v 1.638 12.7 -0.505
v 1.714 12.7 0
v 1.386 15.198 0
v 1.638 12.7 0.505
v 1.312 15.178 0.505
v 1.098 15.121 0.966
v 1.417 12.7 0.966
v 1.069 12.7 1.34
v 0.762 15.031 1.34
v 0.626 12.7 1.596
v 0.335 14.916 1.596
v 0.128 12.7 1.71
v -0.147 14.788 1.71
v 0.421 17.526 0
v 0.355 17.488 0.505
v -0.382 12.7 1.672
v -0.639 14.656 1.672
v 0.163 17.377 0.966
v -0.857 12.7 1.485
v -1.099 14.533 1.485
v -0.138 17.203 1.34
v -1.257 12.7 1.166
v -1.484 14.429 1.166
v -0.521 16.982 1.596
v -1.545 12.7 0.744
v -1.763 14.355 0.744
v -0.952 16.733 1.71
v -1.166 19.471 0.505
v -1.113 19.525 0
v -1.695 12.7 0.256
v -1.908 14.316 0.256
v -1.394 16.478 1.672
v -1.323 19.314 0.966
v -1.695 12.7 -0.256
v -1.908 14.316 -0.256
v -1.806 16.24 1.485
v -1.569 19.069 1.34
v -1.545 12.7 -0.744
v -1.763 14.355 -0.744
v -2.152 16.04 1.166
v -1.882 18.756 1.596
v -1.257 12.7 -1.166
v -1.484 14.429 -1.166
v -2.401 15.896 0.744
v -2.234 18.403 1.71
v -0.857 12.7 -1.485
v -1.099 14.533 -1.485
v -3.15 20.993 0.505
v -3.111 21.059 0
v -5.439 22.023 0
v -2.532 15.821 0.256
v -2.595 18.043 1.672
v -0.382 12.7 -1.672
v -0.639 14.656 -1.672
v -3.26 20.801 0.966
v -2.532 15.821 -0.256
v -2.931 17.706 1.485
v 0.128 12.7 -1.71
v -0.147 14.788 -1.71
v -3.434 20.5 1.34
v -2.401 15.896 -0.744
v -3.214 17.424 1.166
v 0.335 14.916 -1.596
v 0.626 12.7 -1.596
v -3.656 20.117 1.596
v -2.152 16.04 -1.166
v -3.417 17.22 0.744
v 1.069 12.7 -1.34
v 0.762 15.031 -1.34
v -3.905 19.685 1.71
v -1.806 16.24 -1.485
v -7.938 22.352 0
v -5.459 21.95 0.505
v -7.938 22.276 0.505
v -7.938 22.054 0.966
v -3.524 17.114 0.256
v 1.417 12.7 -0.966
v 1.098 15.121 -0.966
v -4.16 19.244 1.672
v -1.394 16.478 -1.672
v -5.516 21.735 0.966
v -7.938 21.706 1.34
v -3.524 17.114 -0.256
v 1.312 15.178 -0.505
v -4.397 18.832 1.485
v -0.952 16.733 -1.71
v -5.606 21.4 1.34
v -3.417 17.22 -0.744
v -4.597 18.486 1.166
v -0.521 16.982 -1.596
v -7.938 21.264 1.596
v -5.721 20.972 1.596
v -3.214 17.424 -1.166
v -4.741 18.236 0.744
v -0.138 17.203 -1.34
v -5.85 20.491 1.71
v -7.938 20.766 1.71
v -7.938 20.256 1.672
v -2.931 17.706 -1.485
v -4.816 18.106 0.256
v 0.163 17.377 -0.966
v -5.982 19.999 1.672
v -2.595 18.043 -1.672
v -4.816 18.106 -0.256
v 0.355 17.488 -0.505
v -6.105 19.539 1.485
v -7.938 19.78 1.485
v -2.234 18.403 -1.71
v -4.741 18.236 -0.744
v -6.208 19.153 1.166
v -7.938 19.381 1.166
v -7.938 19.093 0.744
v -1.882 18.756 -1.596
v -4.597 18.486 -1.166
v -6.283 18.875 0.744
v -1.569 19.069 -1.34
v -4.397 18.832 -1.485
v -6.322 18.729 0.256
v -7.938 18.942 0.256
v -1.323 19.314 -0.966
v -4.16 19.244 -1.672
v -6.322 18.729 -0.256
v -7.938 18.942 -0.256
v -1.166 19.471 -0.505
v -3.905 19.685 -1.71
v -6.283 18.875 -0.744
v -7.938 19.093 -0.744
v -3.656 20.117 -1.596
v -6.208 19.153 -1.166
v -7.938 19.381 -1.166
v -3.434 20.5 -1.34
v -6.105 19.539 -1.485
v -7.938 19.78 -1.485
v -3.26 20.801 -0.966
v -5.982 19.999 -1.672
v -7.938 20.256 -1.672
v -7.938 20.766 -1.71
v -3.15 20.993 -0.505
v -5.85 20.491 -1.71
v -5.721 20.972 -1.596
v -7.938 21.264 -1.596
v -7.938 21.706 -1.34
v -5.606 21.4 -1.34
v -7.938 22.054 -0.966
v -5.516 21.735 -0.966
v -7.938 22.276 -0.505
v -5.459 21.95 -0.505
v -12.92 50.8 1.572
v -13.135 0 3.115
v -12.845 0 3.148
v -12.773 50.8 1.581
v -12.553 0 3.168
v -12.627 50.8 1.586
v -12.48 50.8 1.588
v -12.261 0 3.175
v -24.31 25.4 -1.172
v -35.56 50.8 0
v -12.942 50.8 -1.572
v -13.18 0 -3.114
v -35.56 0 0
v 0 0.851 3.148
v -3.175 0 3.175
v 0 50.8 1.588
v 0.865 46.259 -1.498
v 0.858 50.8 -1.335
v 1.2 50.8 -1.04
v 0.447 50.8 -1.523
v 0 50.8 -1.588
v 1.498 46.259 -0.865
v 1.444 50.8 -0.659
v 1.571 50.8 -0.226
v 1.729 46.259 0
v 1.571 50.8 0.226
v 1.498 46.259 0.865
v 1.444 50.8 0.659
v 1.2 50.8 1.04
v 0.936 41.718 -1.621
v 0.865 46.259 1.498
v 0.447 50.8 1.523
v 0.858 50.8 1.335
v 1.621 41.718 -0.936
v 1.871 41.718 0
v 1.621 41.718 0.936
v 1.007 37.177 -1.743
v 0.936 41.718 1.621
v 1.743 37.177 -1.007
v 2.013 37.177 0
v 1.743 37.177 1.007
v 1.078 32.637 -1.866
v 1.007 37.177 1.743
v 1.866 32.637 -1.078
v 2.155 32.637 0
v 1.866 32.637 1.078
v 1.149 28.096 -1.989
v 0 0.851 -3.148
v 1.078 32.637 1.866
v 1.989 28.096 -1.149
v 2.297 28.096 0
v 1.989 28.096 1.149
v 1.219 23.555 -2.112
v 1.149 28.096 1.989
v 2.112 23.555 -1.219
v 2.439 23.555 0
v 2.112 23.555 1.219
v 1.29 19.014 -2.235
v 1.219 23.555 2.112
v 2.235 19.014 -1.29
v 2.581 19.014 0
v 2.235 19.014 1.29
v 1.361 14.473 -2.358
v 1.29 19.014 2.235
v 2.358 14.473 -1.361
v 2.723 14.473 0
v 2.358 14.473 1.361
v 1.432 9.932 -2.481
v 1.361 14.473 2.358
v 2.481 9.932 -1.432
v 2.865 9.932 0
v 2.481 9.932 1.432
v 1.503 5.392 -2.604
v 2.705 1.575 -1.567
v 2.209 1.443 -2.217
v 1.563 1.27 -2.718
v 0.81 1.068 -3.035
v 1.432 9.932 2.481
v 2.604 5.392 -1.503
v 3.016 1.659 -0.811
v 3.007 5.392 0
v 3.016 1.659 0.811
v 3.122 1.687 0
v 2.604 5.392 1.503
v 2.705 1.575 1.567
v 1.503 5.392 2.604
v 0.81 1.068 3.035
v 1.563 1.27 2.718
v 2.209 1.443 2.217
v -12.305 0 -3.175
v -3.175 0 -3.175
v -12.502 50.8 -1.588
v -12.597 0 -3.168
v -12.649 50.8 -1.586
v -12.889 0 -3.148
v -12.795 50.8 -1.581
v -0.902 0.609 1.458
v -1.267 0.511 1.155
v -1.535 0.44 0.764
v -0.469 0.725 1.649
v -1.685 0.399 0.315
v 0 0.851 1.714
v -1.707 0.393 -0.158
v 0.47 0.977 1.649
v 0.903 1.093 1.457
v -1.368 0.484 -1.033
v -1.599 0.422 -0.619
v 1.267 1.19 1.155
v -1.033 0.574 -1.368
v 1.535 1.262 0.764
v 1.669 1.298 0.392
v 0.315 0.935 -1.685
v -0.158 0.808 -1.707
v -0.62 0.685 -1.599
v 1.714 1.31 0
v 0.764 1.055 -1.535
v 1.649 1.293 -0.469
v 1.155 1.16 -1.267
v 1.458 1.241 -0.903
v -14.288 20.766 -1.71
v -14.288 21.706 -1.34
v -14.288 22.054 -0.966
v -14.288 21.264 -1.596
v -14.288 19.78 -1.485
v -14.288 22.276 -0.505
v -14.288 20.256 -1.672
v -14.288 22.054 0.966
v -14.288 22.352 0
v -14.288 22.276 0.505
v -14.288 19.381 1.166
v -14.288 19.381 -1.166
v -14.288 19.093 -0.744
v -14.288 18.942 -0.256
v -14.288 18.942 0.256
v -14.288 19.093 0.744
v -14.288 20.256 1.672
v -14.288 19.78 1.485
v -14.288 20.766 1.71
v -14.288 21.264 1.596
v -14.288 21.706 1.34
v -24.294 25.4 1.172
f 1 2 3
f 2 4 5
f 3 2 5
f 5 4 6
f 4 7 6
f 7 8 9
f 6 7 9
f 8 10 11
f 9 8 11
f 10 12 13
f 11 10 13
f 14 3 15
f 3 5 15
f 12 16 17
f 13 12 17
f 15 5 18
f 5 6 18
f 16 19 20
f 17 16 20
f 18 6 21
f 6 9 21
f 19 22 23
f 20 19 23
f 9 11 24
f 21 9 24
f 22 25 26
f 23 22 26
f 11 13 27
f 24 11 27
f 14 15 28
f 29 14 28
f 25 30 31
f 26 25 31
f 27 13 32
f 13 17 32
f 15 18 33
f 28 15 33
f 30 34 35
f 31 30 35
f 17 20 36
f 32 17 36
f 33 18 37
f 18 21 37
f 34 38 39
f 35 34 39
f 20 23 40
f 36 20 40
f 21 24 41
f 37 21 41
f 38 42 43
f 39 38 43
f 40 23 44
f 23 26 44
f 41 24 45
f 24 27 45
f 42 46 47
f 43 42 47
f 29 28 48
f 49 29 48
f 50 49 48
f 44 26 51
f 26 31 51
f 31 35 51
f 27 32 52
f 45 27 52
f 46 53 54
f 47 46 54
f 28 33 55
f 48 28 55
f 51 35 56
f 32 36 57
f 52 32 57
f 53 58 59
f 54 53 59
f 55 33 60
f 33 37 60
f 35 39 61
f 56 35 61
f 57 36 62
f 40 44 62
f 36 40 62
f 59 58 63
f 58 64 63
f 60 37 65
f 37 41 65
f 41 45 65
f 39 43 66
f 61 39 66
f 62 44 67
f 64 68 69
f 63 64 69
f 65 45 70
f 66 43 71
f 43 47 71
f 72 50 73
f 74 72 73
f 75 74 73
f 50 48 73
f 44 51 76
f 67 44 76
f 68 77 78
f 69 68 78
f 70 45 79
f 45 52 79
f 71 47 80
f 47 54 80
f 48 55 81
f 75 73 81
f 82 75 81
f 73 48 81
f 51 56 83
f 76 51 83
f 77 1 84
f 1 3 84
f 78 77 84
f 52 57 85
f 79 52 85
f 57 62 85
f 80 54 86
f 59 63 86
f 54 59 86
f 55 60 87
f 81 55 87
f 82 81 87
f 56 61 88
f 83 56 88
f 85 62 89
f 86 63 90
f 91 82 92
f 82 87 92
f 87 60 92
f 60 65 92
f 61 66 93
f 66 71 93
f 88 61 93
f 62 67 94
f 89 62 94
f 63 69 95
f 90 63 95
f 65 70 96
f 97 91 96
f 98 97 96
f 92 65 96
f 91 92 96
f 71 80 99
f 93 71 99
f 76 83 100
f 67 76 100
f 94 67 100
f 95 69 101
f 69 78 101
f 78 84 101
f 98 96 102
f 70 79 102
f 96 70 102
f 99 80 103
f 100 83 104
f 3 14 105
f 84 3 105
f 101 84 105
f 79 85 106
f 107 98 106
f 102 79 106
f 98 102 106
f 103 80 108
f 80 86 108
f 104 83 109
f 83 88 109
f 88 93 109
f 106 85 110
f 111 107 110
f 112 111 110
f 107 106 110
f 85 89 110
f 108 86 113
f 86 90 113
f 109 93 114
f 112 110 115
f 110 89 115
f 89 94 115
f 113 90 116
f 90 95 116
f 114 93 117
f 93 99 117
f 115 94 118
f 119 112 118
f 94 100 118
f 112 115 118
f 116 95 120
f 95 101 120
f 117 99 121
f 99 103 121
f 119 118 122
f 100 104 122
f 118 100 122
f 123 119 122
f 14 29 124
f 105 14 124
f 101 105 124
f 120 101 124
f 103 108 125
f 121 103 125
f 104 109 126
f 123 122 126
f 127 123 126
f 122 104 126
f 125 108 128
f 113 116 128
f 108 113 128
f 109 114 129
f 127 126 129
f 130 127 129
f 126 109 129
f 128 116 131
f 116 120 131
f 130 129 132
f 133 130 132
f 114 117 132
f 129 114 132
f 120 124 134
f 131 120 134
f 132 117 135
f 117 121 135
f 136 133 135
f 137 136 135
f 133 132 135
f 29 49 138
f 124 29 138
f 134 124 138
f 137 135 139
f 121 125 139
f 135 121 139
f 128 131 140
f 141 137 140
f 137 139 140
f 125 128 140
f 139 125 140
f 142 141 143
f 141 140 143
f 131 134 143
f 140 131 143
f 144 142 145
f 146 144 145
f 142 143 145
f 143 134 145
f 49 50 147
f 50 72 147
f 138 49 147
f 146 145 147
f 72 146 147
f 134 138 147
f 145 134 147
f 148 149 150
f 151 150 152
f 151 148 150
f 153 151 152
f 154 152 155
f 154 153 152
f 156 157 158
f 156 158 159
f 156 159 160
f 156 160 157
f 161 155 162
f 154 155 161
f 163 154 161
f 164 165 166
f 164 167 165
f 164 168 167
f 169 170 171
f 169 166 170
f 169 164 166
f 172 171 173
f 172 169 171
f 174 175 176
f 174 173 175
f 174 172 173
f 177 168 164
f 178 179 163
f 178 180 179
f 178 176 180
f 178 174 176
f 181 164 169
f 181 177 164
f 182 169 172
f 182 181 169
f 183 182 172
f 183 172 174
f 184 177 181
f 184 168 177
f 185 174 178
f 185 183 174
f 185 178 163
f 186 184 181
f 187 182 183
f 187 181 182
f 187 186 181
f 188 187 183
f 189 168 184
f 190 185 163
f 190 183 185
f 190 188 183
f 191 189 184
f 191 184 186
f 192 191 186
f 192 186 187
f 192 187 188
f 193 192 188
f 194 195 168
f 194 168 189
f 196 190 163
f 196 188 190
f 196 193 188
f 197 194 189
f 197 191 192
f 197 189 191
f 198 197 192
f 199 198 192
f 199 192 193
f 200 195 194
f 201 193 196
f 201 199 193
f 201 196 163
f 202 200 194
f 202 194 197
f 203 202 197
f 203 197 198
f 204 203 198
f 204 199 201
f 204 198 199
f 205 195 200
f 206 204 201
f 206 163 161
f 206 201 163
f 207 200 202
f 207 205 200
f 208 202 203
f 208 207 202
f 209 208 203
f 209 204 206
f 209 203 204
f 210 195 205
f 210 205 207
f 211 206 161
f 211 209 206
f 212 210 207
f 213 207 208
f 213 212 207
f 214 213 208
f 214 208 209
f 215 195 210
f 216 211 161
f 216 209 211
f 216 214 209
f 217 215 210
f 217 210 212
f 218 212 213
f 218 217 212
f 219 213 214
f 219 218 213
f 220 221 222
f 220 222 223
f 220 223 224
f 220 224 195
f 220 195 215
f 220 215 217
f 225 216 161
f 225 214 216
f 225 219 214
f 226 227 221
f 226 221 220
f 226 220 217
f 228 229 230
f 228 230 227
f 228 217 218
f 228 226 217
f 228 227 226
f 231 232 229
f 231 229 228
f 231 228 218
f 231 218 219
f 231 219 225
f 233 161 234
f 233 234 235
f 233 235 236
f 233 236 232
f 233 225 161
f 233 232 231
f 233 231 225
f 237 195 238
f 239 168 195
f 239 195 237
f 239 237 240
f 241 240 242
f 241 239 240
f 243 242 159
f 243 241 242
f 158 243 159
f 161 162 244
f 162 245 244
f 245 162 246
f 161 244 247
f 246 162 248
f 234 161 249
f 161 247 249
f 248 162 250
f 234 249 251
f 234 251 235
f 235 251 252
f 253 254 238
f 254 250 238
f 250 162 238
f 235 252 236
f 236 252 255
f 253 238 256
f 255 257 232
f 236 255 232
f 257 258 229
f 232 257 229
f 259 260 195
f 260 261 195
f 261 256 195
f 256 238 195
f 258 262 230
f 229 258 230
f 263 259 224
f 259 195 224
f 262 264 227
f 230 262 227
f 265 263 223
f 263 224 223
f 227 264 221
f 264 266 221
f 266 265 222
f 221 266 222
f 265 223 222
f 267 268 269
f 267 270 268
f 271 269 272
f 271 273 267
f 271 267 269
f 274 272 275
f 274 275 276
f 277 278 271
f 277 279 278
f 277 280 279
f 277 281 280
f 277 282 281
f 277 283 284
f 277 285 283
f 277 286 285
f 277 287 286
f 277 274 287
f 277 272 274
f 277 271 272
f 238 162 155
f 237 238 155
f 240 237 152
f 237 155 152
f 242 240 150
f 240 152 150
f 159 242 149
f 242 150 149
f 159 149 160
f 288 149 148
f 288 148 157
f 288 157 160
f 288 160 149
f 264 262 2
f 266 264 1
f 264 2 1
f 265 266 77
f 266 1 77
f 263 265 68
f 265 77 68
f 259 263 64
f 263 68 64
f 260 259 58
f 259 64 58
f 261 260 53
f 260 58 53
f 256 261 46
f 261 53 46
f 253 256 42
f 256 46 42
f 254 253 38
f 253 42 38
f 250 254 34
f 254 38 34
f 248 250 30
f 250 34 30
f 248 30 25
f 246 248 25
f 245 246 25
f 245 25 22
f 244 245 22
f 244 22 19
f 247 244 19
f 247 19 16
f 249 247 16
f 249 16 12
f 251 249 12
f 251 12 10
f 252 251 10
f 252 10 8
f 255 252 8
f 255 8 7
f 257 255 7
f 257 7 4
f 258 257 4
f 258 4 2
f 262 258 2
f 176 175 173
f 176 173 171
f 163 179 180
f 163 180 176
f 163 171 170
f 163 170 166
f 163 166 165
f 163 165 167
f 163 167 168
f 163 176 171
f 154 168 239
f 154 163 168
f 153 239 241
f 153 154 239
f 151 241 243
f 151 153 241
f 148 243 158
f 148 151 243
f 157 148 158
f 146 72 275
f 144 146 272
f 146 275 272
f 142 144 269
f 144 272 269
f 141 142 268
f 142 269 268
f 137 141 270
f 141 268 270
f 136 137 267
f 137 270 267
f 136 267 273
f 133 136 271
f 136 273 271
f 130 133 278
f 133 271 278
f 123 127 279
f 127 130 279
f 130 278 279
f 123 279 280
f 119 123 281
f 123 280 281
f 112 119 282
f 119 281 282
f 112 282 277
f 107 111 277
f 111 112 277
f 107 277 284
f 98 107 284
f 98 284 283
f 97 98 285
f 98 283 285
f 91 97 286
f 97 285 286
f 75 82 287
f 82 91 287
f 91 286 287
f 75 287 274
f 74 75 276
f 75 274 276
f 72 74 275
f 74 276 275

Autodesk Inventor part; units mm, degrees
ref_plane "YZ Plane" through (0, 0, 0) normal (1, 0, 0) x (0, 1, 0)
ref_plane "XY Plane" through (0, 0, 0) normal (0, 0, 1) x (1, 0, 0)
sketch "Sketch2" plane through (0, 0, 0) normal (0, 1, 0) x (-1, 0, 0)
  circle A0 centre (0, 0) radius 3.175
  line L0 (0, 0) -> (35.56, 0)
  line L1 (0, 3.175) -> (12.2611, 3.175)
  line L2 (0, -3.175) -> (12.3047, -3.175)
  line L3 (13.1799, -3.1144) -> (35.56, 0)
  line L4 (35.56, 0) -> (13.1347, 3.1146)
  arc A1 (13.1347, 3.1146) -> (12.2611, 3.175) centre (12.2611, -3.175) ccw
  arc A2 (12.3047, -3.175) -> (13.1799, -3.1144) centre (12.3047, 3.175) ccw
  circle A3 centre (0, 0) radius 1.5875
  point P0 (12.7, 3.175)
  dimension "d5" = 6.35
  dimension "d6" = 35.56
  dimension "d7" = 12.7
  dimension "d8" = 6.35
  dimension "d9" = 6.35
  dimension "d12" = 3.175
ref_plane "Work Plane1" through (0, 50.8, 0) normal (0, 1, 0) x (-1, 0, 0)
sketch "Sketch3" plane through (0, 50.8, 0) normal (0, 1, 0) x (-1, 0, 0)
  circle A0 centre (0, 0) radius 1.5875
  line L0 (0, 1.5875) -> (12.4798, 1.5875)
  line L1 (0, -1.5875) -> (12.5018, -1.5875)
  line L2 (12.9421, -1.5722) -> (35.56, 0)
  line L3 (35.56, 0) -> (12.9197, 1.5722)
  arc A1 (12.9197, 1.5722) -> (12.4798, 1.5875) centre (12.4798, -4.7625) ccw
  arc A2 (12.5018, -1.5875) -> (12.9421, -1.5722) centre (12.5018, 4.7625) ccw
  point P0 (12.7, 1.5875)
  dimension "d14" = 3.175
  dimension "d15" = 12.7
  dimension "d16" = 6.35
  dimension "d17" = 6.35
loft "Loft1" add profiles "Sketch2", "Sketch3" contours A0 | L0 L3 A2 L2 A0 | A0 L1 A1 L4 L0 | A3 / all
sketch "Sketch4" plane through (0, 0, 0) normal (0, 0, 1) x (1, 0, 0)
  line L0 (-12.2611, 0) -> (0, 0) projected
  line L1 (0, 0) -> (0, 12.7)
  line L2 (0, 0) -> (0, 50.8) projected
  line L3 (0, 12.7) -> (-7.9375, 12.7)
  line L4 (-7.9375, 12.7) -> (-7.9375, 20.6375)
  arc A0 (0, 12.7) -> (-7.9375, 20.6375) centre (-7.9375, 12.7) ccw
  line L5 (-7.9375, 20.6375) -> (-14.2875, 20.6375)
  dimension "d22" = 12.7
  dimension "d23" = 7.9375
  dimension "d24" = 7.9375
  dimension "d25" = 6.35
sketch "Sketch5" plane through (-12.3047, 0, -3.175) normal (0, -1, 0) x (1, 0, 0)
  circle A0 centre (12.3047, 3.175) radius 1.7145
  dimension "d26" = 3.429
sweep "Sweep1" cut profiles "Sketch5" path "Sketch4" path curves L1 A0 L5
sketch "Sketch6" plane through (0, 0, 0) normal (0, 0, 1) x (1, 0, 0)
  line L0 (3.175, 0) -> (0, 0) projected
  line L1 (3.175, 0) -> (-3.175, 0)
  line L2 (0, 0) -> (-12.3047, 0) projected
  line L3 (-3.175, 0) -> (3.1223, 1.6873)
  line L4 (3.175, 0) -> (1.5875, 50.8) projected
  dimension "d29" = 6.35
  dimension "d30" = 15
extrude "Extrusion3" cut sketch "Sketch6" along normal mid plane 25.4
properties part number "DivePlanesControlSurface"
